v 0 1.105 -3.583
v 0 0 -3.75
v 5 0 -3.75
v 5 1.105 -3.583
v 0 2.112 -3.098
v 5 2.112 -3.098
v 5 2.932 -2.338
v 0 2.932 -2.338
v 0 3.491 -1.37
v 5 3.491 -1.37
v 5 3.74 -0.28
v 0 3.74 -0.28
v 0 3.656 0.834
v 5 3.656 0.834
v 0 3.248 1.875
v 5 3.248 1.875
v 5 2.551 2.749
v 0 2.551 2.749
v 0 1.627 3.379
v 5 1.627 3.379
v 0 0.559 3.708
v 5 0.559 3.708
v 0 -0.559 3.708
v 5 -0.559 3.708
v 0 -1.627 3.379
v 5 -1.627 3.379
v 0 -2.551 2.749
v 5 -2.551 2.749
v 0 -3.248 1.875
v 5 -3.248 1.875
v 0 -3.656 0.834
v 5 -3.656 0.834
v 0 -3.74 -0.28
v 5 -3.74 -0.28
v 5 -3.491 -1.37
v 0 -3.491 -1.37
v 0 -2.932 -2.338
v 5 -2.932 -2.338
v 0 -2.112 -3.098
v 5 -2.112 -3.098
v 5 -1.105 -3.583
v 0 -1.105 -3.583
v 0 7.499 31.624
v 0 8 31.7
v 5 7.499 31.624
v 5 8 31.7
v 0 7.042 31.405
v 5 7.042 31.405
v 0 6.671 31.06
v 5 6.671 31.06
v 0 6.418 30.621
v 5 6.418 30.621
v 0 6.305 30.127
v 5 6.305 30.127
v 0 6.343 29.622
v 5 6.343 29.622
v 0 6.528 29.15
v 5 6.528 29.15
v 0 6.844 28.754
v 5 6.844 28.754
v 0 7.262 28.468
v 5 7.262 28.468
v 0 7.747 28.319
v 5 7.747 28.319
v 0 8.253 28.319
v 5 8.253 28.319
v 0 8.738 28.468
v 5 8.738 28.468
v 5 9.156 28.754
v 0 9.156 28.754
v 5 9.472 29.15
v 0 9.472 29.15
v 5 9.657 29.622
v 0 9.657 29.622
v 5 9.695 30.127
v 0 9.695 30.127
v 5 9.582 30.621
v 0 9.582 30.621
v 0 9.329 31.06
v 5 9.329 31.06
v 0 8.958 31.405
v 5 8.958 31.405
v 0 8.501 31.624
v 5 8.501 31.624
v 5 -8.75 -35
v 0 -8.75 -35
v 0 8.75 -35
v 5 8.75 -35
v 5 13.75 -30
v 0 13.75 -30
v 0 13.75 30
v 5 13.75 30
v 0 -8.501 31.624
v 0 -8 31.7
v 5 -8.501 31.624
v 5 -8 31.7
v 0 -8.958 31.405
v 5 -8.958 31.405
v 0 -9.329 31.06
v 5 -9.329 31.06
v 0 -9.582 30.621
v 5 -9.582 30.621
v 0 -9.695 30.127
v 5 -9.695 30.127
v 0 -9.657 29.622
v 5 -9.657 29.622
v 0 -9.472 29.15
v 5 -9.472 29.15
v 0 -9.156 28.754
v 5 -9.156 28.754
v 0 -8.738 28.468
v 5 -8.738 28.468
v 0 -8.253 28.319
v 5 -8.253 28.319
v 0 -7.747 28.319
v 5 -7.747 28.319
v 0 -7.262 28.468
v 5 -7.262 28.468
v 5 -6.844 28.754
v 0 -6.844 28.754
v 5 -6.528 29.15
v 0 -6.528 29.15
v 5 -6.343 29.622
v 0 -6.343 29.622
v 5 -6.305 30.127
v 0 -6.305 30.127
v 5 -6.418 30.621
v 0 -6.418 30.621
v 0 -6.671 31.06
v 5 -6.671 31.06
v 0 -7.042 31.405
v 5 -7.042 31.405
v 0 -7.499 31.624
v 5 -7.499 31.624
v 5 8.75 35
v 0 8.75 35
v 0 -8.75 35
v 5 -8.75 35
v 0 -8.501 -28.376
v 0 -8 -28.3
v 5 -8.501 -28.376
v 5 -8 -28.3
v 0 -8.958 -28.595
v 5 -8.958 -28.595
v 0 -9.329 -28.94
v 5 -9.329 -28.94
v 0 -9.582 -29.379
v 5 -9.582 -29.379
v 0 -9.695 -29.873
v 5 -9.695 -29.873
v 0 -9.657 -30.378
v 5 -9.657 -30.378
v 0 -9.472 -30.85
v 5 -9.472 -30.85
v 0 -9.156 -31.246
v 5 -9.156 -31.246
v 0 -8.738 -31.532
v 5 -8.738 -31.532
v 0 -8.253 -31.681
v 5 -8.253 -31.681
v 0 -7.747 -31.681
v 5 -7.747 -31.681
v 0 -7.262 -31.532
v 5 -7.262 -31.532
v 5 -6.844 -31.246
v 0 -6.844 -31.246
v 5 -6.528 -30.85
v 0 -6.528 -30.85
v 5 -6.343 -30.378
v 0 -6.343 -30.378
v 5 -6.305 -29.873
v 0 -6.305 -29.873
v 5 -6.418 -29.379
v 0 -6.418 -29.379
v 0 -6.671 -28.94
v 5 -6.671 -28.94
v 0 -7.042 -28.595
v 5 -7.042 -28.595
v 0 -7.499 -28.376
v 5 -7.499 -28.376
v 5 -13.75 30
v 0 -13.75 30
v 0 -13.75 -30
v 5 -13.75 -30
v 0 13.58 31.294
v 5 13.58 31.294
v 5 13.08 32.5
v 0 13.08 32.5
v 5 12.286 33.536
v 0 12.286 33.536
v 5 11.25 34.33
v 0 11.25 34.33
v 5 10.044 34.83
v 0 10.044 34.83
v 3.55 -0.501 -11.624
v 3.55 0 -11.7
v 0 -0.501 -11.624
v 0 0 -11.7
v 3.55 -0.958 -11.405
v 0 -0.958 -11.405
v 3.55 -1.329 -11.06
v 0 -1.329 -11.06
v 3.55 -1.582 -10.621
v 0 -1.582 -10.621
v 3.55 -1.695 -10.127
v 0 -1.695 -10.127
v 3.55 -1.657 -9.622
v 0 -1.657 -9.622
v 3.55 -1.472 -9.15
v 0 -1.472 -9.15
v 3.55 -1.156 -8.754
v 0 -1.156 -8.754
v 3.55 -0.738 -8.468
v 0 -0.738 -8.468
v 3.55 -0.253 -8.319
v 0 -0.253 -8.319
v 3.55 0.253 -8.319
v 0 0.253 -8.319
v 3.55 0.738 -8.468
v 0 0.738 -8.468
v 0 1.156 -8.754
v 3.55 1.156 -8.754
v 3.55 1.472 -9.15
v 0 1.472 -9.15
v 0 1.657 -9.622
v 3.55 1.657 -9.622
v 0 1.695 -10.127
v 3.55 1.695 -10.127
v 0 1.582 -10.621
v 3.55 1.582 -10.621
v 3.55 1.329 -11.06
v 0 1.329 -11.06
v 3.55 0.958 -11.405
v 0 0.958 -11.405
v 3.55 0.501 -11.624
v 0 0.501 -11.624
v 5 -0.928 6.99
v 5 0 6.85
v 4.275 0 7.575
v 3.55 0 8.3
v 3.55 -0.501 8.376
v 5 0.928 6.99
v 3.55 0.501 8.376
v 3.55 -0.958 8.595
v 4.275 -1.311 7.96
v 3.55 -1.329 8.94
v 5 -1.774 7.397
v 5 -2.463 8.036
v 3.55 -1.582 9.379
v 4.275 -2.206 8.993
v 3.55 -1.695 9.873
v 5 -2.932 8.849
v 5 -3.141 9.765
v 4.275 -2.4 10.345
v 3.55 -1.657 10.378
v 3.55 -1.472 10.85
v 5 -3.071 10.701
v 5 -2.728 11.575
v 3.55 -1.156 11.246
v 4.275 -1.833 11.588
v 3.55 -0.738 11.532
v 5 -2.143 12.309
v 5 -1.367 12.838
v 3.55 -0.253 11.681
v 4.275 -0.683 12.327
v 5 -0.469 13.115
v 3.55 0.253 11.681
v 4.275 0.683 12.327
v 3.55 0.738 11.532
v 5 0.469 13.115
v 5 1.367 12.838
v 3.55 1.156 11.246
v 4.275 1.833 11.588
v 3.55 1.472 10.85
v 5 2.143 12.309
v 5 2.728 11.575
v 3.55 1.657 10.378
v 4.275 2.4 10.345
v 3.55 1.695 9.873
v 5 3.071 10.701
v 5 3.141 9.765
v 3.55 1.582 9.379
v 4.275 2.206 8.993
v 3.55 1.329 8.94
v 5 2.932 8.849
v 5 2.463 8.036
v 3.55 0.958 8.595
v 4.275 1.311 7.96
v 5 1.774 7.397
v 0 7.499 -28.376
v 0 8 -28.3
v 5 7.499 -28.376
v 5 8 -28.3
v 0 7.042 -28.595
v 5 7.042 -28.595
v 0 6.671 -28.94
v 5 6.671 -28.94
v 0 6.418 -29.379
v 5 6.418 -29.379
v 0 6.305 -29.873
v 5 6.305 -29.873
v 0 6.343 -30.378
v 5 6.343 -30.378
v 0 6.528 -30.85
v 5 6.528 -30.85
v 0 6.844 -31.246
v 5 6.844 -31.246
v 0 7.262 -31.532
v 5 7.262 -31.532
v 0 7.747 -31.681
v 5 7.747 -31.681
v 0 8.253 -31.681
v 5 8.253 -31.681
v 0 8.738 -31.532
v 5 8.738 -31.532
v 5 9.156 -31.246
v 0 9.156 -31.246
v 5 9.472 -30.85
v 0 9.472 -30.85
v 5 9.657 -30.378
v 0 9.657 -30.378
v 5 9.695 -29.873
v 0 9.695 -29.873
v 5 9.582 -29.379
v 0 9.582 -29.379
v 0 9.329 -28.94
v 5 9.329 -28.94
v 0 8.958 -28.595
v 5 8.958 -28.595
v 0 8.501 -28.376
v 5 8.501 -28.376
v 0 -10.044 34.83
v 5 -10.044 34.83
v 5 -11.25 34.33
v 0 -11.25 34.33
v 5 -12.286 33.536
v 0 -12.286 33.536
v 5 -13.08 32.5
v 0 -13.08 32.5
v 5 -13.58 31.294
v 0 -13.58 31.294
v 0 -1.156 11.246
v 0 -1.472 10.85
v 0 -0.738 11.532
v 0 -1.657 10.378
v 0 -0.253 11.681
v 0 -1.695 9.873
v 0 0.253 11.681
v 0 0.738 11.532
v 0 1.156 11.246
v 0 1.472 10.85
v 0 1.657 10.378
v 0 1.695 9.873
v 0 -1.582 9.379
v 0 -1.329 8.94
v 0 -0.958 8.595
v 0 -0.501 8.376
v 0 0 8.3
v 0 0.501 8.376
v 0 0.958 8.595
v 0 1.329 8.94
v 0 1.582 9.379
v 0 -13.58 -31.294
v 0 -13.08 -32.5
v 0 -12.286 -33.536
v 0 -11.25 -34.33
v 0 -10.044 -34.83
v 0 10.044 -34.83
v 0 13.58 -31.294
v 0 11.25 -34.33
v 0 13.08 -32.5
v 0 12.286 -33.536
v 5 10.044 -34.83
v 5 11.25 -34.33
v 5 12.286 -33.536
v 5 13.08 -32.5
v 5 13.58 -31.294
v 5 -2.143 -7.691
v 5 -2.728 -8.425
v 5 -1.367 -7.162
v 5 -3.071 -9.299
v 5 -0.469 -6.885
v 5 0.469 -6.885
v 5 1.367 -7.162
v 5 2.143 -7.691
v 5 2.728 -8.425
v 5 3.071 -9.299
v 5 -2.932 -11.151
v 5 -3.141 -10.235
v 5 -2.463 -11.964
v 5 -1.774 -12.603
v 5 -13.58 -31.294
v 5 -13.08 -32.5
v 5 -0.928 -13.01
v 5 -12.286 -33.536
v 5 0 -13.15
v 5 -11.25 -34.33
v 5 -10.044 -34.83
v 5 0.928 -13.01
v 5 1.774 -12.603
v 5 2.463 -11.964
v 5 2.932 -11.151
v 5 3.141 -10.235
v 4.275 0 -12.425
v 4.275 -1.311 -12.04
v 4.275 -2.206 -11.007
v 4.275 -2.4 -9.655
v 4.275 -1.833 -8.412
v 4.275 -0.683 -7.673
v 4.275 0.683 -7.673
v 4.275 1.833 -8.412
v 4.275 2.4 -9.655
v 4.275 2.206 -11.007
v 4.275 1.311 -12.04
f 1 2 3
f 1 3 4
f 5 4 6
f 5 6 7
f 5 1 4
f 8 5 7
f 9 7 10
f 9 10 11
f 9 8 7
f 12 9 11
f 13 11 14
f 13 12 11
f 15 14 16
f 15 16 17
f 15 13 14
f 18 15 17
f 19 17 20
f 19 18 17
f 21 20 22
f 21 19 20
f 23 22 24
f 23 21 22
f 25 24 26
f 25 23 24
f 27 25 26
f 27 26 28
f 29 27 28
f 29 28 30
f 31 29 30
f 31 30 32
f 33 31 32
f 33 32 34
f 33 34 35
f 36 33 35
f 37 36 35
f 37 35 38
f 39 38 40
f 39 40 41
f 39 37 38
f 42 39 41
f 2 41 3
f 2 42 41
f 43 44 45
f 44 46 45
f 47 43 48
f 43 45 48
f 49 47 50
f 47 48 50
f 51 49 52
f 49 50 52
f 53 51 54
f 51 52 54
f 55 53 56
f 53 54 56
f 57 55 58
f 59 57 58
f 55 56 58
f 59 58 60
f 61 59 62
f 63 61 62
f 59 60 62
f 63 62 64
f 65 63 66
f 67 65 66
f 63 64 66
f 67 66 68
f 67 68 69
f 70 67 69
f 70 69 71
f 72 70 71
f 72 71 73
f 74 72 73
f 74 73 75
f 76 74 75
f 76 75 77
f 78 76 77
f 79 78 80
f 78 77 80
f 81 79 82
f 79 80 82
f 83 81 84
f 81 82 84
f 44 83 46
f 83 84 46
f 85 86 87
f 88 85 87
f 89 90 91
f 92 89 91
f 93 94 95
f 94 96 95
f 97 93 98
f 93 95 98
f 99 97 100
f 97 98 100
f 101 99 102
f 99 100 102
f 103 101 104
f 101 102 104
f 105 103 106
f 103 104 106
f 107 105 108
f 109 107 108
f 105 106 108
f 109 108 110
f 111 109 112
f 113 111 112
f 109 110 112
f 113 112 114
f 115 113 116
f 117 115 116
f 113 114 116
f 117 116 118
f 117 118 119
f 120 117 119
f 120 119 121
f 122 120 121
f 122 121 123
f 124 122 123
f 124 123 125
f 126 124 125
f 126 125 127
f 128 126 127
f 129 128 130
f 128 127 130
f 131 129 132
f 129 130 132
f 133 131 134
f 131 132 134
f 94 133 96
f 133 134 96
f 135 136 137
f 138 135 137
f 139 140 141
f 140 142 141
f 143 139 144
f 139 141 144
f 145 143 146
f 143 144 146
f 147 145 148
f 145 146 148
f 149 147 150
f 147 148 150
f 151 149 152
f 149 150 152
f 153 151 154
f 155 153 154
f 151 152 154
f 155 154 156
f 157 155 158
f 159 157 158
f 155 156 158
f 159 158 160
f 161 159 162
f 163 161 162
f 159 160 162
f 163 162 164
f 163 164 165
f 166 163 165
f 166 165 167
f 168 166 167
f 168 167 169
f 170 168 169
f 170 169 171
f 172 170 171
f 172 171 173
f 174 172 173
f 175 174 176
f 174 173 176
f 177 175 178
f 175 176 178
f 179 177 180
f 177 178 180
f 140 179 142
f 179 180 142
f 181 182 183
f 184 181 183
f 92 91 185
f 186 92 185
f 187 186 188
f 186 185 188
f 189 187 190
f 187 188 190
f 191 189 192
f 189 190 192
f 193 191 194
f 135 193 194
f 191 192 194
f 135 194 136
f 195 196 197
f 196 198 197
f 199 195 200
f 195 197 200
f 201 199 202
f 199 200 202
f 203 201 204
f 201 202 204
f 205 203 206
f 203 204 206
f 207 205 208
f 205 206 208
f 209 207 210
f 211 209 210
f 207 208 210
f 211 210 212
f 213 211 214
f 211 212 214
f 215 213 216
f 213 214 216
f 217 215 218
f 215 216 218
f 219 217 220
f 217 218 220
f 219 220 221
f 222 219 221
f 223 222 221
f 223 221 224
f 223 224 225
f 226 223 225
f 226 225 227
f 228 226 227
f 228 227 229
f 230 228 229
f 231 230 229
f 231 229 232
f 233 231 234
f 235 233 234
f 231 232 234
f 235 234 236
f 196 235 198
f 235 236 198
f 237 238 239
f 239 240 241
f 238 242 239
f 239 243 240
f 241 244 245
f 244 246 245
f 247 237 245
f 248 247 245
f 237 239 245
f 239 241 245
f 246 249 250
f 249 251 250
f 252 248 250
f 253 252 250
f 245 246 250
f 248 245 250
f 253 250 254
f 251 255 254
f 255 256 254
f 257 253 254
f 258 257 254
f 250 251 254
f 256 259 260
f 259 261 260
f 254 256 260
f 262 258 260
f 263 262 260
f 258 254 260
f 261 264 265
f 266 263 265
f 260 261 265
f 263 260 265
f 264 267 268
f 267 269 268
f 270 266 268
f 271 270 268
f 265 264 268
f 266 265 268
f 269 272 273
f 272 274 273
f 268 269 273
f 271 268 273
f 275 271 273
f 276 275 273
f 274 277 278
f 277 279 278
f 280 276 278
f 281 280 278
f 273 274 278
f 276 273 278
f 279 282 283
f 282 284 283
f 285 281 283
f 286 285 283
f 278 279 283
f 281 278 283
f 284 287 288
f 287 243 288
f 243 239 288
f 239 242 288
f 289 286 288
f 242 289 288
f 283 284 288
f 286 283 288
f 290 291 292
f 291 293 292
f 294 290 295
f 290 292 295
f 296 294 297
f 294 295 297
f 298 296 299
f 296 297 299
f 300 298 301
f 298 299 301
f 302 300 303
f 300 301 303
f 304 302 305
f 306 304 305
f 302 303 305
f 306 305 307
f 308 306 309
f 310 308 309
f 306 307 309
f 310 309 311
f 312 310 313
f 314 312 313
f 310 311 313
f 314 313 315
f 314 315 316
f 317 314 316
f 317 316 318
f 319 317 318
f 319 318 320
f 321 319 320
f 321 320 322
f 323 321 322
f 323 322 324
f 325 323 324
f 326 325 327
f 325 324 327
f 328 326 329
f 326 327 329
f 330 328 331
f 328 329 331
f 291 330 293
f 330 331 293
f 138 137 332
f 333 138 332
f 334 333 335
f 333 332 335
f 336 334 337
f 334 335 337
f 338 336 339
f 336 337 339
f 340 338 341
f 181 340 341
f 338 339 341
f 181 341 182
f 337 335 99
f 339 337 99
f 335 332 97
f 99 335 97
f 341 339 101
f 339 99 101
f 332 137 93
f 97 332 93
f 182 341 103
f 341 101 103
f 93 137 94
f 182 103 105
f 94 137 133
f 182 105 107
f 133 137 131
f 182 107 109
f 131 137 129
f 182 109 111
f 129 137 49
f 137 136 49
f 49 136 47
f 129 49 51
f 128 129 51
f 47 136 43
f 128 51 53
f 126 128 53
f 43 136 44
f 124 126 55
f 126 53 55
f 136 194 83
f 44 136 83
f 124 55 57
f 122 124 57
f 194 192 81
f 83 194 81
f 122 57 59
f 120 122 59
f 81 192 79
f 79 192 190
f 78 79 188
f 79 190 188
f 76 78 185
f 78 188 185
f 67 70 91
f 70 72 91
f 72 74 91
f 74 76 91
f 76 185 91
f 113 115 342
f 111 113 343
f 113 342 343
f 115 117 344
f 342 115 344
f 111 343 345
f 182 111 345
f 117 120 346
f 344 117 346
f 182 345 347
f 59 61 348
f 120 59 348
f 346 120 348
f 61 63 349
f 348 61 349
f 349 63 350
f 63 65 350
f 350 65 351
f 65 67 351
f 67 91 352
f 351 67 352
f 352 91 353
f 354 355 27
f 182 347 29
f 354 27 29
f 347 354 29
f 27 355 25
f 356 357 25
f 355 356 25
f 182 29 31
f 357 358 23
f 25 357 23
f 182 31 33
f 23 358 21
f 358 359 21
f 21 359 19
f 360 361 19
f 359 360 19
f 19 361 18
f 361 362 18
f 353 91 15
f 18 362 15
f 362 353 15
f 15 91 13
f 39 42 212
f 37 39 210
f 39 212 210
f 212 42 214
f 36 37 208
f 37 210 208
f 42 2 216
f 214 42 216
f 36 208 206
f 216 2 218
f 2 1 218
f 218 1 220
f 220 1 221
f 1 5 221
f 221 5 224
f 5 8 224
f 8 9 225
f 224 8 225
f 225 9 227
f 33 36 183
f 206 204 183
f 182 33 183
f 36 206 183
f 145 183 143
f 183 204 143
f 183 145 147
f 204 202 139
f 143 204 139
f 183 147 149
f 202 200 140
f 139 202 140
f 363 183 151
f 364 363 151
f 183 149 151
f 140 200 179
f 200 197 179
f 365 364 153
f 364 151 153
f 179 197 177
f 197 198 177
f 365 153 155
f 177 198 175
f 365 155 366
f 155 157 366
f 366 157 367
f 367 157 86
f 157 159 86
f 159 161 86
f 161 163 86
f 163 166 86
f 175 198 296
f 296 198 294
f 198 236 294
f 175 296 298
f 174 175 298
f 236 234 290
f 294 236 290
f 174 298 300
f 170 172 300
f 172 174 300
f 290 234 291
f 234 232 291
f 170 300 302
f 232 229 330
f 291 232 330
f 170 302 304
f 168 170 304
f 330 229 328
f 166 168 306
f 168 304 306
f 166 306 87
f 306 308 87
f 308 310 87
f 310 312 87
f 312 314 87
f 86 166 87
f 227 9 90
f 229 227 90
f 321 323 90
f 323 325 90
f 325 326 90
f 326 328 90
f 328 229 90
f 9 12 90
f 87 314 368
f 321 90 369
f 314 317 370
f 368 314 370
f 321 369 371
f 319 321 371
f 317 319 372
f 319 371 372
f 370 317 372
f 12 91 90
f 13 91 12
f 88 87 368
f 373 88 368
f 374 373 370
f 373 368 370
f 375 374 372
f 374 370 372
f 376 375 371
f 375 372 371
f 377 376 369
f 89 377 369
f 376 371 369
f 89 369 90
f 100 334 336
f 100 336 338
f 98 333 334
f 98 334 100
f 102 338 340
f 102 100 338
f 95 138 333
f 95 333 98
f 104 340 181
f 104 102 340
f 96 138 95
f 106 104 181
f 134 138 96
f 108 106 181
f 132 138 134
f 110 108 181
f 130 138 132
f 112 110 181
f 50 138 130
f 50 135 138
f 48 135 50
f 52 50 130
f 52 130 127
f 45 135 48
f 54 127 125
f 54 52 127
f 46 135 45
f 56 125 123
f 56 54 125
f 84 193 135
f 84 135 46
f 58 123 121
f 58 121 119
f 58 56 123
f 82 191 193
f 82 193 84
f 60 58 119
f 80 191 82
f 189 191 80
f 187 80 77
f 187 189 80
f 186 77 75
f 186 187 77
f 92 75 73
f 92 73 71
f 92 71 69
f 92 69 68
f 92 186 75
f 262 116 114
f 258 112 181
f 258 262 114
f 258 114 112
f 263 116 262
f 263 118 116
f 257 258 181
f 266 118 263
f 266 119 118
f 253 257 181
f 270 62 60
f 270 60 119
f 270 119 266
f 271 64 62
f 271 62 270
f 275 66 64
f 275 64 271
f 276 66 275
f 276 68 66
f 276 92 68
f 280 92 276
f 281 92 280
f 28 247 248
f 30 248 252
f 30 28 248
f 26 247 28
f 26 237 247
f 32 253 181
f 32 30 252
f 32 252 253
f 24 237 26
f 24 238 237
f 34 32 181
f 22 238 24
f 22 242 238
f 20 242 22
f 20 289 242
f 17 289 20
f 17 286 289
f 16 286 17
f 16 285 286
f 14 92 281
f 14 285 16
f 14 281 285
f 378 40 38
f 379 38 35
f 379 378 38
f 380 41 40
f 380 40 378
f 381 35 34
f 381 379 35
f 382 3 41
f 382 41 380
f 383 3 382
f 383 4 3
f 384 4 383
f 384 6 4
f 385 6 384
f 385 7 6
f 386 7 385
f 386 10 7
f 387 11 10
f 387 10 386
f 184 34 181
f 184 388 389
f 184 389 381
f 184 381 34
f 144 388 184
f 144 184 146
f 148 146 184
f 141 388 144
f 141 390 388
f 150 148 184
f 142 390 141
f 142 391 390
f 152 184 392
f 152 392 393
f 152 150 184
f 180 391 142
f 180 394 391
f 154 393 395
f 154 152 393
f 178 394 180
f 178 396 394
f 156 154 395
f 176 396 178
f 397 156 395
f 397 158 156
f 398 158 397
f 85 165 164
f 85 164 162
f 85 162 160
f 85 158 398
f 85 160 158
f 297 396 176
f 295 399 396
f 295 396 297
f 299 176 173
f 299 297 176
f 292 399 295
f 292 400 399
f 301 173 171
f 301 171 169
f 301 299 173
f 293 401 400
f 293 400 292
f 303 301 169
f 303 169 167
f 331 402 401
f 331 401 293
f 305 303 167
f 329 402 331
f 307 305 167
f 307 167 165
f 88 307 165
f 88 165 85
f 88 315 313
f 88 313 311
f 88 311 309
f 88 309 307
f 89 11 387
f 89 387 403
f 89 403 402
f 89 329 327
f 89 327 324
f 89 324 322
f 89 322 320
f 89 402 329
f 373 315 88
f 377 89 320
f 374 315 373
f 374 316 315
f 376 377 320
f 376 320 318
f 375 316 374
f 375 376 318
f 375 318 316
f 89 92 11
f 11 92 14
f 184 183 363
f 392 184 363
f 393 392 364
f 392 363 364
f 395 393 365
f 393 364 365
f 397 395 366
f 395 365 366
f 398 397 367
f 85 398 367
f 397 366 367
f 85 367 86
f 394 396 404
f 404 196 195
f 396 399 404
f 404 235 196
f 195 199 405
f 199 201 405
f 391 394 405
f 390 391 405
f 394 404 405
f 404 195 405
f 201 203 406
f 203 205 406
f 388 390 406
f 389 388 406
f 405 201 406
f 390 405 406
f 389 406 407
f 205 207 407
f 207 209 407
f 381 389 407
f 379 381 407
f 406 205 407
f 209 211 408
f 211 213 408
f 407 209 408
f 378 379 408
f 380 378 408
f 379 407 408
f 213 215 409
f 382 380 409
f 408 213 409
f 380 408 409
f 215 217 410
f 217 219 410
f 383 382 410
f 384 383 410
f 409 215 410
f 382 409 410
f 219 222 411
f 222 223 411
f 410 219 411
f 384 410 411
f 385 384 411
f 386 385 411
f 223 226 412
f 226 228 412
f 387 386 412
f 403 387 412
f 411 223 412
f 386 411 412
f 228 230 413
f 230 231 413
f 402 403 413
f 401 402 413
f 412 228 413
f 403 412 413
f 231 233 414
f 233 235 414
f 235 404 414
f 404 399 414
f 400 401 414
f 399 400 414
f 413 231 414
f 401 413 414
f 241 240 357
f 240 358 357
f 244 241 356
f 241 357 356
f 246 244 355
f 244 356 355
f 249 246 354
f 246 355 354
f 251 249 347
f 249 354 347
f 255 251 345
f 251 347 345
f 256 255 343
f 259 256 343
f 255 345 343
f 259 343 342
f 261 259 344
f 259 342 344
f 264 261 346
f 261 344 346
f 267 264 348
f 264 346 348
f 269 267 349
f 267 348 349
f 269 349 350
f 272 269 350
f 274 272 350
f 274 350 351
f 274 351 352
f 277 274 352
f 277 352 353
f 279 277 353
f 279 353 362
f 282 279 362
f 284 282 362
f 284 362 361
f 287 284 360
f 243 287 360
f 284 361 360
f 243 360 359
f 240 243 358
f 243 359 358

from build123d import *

# Parameters (mm, degrees)
SKETCH1_R                                           = 3.75
BOSS_EXTRUDE1_DEPTH                                 = 5
CSK_FOR_M3_COUNTERSUNK_FLAT_HEAD_SCREW1_D           = 3.4
CSK_FOR_M3_COUNTERSUNK_FLAT_HEAD_SCREW1_CSINK_D     = 6.3
CSK_FOR_M3_COUNTERSUNK_FLAT_HEAD_SCREW1_CSINK_ANGLE = 90
M3_CLEARANCE_HOLE3_D                                = 3.4
M3_CLEARANCE_HOLE3_DEPTH                            = 5
M3_CLEARANCE_HOLE3_TIP                              = 1.021463052


with BuildPart() as part:
    # Sketch1 → Boss-Extrude1 (new body)
    with BuildSketch(Plane(origin=(0, 0, 0), x_dir=(0, 0, -1), z_dir=(1, 0, 0))):
        with BuildLine():
            Line((-30, -13.75), (30, -13.75))
            ThreePointArc((30, -13.75), (33.535533906, -12.285533906), (35, -8.75))
            Line((35, -8.75), (35, 8.75))
            ThreePointArc((35, 8.75), (33.535533906, 12.285533906), (30, 13.75))
            Line((30, 13.75), (-30, 13.75))
            ThreePointArc((-30, 13.75), (-33.535533906, 12.285533906), (-35, 8.75))
            Line((-35, 8.75), (-35, -8.75))
            ThreePointArc((-35, -8.75), (-33.535533906, -12.285533906), (-30, -13.75))
        make_face()
        Circle(SKETCH1_R, mode=Mode.SUBTRACT)
    extrude(amount=BOSS_EXTRUDE1_DEPTH)

    # CSK for M3 Countersunk Flat Head Screw1 (through all)
    with Locations(Plane(origin=(5, 0, 10), x_dir=(0, 0, 1), z_dir=(1, 0, 0))):
        with Locations((0, 0), (-20, 0)):
            CounterSinkHole(CSK_FOR_M3_COUNTERSUNK_FLAT_HEAD_SCREW1_D / 2, CSK_FOR_M3_COUNTERSUNK_FLAT_HEAD_SCREW1_CSINK_D / 2, counter_sink_angle=CSK_FOR_M3_COUNTERSUNK_FLAT_HEAD_SCREW1_CSINK_ANGLE)

    # M3 Clearance Hole3
    with Locations(Plane(origin=(0, 8, 30), x_dir=(0, 0, -1), z_dir=(-1, 0, 0))):
        with Locations((0, 0), (0, 16), (60, 16), (60, 0)):
            Hole(M3_CLEARANCE_HOLE3_D / 2, depth=M3_CLEARANCE_HOLE3_DEPTH)
            with Locations((0, 0, -(M3_CLEARANCE_HOLE3_DEPTH + M3_CLEARANCE_HOLE3_TIP / 2))):  # 118° drill point
                Cone(0, M3_CLEARANCE_HOLE3_D / 2, M3_CLEARANCE_HOLE3_TIP, mode=Mode.SUBTRACT)


solid = part.part
